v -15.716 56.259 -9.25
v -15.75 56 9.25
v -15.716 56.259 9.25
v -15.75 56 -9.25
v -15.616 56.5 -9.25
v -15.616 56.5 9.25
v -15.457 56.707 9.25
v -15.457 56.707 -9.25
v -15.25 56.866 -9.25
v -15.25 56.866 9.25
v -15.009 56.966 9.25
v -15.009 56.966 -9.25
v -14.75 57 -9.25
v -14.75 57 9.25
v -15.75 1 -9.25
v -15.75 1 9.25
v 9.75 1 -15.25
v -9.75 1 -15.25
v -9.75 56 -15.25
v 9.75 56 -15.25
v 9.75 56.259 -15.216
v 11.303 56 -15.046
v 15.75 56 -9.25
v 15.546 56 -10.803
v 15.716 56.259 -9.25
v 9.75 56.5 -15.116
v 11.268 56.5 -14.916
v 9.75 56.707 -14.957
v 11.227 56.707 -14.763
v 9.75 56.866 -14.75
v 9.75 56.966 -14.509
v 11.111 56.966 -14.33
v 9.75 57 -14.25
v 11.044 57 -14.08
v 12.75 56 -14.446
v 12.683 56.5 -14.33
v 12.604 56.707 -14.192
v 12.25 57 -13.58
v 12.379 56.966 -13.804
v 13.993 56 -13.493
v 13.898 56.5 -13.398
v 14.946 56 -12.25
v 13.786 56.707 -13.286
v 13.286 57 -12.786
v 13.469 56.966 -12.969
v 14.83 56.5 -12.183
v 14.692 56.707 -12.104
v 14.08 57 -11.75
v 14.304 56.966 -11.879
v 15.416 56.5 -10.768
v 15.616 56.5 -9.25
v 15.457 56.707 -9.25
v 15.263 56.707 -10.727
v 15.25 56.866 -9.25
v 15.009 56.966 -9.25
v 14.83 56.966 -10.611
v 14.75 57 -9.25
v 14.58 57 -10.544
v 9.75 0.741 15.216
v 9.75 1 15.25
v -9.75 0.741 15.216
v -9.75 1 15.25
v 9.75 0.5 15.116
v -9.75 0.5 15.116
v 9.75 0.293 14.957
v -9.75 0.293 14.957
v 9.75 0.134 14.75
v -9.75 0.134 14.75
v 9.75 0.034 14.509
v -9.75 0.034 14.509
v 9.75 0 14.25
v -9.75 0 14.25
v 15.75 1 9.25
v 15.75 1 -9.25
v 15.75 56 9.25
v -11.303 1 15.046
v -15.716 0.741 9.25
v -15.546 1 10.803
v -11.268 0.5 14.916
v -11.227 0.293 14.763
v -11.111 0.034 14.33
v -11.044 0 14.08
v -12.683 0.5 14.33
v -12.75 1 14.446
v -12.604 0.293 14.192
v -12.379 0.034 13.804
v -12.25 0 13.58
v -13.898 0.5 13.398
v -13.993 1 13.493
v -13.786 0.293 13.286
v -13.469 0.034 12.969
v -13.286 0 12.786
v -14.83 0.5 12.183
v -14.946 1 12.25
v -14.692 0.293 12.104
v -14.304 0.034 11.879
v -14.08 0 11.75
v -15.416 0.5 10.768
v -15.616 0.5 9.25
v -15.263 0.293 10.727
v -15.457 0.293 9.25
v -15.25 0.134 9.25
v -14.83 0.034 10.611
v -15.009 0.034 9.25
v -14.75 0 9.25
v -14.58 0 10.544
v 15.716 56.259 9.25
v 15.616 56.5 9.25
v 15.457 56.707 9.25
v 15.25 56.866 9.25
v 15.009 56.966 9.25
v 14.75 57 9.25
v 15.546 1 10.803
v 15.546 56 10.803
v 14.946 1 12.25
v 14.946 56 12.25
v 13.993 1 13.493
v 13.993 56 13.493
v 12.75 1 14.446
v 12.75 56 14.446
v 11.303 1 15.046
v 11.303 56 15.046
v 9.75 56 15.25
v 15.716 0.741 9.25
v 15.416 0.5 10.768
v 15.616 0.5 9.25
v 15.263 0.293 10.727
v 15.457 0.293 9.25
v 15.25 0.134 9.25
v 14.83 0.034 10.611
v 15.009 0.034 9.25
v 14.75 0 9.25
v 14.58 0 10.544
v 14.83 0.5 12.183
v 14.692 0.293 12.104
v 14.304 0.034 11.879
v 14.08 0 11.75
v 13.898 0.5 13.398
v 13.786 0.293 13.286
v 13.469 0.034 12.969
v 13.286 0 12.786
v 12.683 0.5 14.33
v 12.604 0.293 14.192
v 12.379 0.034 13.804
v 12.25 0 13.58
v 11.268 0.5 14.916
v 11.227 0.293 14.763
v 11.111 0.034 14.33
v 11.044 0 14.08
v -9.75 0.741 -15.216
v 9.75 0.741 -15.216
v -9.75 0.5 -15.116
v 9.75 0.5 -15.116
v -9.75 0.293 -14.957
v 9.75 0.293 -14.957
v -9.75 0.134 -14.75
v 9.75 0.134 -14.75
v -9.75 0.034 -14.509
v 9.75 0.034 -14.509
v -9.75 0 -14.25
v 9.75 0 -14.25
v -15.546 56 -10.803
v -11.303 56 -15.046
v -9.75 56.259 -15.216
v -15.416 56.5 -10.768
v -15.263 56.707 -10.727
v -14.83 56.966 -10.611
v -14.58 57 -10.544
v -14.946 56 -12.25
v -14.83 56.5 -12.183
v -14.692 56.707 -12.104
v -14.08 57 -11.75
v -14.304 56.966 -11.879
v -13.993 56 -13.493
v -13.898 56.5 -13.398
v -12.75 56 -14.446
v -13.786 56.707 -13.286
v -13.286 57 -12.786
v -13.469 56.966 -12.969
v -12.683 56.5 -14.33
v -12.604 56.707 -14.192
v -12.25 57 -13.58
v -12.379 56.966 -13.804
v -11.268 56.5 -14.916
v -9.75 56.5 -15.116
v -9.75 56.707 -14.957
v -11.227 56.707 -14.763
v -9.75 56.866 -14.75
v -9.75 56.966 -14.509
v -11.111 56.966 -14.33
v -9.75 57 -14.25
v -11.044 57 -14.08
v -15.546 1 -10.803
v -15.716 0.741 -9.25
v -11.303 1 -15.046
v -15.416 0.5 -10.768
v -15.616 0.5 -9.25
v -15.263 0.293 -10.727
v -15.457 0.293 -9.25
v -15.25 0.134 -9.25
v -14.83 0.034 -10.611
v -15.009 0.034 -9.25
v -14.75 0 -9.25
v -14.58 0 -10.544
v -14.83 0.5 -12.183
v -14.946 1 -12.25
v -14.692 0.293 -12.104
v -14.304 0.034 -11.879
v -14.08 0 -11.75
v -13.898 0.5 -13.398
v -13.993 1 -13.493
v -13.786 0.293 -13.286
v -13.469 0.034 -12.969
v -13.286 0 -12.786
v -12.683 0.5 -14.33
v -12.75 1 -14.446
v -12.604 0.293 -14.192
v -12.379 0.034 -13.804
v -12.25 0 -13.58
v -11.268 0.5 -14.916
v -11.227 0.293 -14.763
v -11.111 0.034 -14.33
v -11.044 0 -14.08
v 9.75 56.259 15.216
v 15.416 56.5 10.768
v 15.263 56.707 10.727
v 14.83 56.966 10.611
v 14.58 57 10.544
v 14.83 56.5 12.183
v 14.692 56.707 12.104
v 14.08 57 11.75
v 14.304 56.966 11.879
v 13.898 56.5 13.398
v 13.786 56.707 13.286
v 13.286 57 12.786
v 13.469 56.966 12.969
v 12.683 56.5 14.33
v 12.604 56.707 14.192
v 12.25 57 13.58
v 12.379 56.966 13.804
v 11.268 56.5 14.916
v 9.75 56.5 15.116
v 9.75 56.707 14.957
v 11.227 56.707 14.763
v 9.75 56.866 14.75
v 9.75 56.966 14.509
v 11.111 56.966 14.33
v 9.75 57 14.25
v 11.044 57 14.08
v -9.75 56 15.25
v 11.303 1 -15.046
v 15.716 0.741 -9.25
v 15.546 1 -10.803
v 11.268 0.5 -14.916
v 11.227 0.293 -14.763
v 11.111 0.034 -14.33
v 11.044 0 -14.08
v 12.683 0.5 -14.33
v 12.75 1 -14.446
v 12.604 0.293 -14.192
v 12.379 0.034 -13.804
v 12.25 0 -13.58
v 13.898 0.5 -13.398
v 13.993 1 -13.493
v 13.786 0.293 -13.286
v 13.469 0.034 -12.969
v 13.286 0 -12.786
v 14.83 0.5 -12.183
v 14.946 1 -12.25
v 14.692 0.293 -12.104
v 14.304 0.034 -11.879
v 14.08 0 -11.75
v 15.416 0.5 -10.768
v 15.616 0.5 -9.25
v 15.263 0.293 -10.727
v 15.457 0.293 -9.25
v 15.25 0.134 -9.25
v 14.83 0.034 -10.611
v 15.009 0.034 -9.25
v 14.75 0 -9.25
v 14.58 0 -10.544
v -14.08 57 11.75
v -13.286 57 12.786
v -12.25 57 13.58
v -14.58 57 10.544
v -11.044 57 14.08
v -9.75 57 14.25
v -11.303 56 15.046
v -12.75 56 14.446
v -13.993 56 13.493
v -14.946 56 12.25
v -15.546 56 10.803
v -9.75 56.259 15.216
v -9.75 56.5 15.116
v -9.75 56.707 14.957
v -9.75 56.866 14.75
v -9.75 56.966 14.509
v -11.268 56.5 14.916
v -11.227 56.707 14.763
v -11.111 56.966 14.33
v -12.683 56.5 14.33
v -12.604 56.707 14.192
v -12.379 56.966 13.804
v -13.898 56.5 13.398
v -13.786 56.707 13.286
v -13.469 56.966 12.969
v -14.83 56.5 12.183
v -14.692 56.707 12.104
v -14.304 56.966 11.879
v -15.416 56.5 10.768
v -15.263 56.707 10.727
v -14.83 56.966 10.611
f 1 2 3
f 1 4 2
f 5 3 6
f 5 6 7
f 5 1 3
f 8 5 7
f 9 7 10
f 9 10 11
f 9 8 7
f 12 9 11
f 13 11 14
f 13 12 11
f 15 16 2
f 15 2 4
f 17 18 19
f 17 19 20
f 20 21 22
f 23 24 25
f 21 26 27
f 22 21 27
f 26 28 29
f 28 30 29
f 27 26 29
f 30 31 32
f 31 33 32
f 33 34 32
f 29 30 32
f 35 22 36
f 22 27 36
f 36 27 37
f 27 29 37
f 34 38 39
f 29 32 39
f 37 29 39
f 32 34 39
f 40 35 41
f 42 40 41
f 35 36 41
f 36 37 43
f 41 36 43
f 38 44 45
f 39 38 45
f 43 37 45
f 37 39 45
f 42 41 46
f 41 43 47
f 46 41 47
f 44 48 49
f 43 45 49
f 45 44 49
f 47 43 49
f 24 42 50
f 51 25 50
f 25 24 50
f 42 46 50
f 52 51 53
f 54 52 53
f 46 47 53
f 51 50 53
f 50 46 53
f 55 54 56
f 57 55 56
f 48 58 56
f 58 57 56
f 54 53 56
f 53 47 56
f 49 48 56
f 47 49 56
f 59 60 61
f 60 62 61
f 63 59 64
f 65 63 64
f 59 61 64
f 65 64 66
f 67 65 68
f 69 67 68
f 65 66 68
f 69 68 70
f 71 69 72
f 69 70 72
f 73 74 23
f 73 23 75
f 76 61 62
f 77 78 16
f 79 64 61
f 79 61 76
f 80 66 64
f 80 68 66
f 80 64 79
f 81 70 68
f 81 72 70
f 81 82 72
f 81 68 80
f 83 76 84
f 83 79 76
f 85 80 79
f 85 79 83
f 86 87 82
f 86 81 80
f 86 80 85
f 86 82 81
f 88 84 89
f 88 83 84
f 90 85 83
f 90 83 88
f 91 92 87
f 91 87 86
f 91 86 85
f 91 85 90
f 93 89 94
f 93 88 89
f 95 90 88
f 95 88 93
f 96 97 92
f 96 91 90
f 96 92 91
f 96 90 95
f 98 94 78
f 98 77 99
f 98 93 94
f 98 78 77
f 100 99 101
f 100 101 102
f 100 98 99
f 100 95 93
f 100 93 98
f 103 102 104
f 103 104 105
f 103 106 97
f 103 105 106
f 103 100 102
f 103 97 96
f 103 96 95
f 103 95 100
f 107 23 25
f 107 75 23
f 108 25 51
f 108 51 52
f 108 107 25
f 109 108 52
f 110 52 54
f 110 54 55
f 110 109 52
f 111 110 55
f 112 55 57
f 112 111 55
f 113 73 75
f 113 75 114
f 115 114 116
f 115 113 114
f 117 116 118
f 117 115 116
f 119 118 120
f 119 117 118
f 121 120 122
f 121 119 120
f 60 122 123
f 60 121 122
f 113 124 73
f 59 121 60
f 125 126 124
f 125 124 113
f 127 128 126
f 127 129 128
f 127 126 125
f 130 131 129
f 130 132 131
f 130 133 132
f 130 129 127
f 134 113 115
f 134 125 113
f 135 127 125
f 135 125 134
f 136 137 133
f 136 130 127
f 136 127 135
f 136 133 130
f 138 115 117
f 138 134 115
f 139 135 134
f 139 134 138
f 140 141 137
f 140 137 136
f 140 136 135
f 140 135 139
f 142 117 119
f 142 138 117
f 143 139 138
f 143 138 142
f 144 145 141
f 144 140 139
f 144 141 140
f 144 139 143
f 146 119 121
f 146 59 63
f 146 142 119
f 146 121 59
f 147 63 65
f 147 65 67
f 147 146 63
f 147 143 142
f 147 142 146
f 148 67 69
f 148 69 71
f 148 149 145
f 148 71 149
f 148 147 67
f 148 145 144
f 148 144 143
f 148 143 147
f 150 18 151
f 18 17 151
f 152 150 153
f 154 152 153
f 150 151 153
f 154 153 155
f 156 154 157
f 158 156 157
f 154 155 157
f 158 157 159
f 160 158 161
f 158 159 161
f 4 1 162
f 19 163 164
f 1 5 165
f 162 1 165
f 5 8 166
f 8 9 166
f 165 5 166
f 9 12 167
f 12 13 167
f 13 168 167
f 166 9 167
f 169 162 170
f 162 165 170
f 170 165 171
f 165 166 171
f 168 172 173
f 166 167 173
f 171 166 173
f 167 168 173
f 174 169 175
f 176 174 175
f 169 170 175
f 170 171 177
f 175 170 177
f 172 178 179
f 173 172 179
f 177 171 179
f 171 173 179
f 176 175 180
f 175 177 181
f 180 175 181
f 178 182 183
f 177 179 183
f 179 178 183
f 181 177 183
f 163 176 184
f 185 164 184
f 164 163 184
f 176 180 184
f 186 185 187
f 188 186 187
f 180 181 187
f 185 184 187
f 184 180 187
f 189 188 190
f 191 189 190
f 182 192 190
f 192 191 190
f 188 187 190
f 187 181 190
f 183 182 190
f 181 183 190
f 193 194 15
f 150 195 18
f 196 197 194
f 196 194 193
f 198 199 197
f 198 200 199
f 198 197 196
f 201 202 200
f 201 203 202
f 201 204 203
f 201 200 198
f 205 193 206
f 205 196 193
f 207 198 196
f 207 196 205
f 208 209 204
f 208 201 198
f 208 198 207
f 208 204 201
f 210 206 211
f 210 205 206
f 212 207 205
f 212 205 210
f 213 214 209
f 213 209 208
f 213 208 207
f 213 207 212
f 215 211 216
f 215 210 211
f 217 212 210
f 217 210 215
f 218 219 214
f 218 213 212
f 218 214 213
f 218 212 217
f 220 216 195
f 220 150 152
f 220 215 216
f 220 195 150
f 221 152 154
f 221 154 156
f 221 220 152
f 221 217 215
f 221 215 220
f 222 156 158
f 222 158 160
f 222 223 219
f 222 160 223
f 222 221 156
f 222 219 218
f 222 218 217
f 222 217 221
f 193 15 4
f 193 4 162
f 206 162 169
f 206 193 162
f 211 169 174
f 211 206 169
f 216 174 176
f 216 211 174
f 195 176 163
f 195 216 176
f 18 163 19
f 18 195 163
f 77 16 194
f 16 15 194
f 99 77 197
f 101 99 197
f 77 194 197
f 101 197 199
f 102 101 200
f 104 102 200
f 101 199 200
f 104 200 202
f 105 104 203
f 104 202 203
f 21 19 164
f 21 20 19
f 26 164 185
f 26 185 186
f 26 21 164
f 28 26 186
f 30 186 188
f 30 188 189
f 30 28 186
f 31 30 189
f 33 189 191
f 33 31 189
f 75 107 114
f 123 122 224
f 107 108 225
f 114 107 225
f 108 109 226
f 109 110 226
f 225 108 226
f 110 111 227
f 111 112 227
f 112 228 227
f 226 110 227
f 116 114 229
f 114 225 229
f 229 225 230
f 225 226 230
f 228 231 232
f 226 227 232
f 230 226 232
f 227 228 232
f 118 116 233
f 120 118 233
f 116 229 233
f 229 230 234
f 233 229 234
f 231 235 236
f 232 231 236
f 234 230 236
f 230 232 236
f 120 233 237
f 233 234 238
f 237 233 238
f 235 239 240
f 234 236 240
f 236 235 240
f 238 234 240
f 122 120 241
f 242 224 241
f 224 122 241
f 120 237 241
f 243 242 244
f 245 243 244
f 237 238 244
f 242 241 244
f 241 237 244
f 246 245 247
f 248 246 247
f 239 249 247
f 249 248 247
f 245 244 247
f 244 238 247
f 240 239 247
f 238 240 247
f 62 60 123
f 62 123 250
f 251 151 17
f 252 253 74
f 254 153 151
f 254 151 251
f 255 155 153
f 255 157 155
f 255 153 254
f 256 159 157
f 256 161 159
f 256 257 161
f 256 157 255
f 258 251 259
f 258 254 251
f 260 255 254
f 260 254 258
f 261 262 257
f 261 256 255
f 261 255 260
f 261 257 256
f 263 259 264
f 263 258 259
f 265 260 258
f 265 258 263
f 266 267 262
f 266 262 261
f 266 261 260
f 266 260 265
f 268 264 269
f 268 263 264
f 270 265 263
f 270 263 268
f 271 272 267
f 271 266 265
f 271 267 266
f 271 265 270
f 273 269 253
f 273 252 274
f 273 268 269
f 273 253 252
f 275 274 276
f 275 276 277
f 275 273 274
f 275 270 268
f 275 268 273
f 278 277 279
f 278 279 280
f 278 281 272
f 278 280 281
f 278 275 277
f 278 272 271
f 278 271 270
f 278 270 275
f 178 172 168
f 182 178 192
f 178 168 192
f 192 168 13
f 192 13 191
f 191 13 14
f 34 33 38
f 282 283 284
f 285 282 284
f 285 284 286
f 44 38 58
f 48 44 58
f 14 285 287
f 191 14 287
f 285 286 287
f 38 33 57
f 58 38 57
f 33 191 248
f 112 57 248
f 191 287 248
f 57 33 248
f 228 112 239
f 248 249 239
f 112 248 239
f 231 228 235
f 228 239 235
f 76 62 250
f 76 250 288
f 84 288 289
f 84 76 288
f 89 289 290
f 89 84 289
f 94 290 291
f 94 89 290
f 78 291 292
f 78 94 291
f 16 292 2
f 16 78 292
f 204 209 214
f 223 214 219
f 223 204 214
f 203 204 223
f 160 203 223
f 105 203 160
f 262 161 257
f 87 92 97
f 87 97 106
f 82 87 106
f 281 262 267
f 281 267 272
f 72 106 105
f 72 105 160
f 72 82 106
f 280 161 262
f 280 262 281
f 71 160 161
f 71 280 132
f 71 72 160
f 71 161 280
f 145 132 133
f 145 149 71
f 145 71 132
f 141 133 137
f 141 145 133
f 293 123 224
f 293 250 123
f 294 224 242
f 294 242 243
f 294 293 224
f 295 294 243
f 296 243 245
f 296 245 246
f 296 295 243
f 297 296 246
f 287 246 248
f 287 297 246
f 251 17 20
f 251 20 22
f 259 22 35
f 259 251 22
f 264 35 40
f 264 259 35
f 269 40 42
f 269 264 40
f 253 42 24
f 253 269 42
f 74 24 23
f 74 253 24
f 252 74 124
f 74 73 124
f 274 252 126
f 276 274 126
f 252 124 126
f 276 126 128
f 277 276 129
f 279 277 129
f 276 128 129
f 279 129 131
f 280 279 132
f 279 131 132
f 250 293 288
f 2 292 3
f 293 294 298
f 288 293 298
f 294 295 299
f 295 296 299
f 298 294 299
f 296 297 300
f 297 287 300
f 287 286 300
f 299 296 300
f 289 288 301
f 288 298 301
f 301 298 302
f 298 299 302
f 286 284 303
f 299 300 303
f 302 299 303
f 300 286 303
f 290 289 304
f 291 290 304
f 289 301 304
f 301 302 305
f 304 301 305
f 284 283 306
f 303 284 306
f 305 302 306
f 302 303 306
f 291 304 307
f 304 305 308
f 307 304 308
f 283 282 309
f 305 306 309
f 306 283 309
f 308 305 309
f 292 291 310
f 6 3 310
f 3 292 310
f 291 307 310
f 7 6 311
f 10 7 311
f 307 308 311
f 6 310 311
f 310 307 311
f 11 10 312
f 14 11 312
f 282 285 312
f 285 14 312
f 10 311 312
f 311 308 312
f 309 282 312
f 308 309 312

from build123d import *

# Parameters (mm, degrees)
F1_DEPTH = 57
F2_R     = 1


with BuildPart() as f1:
    # F0 (on Front) → F1 (new body)
    with BuildSketch(Plane.XZ):
        with BuildLine():
            Line((-15.75, 9.25), (-15.75, 0))
            Line((-15.75, 0), (-15.75, -9.25))
            ThreePointArc((-15.75, -9.25), (-13.992641, -13.492641), (-9.75, -15.25))
            Line((-9.75, -15.25), (0, -15.25))
            Line((0, -15.25), (9.75, -15.25))
            ThreePointArc((9.75, -15.25), (13.992641, -13.492641), (15.75, -9.25))
            Line((15.75, -9.25), (15.75, 0))
            Line((15.75, 0), (15.75, 9.25))
            ThreePointArc((15.75, 9.25), (13.992641, 13.492641), (9.75, 15.25))
            Line((9.75, 15.25), (0, 15.25))
            Line((0, 15.25), (-9.75, 15.25))
            ThreePointArc((-9.75, 15.25), (-13.992641, 13.492641), (-15.75, 9.25))
        make_face()
    extrude(amount=-F1_DEPTH)

    # F2
    f2_edges = [f1.edges().sort_by_distance(p)[0] for p in [
        (0, 0, 15.25),
        (0, 57, 15.25),
    ]]
    fillet(f2_edges, radius=F2_R)


solid = f1.part
